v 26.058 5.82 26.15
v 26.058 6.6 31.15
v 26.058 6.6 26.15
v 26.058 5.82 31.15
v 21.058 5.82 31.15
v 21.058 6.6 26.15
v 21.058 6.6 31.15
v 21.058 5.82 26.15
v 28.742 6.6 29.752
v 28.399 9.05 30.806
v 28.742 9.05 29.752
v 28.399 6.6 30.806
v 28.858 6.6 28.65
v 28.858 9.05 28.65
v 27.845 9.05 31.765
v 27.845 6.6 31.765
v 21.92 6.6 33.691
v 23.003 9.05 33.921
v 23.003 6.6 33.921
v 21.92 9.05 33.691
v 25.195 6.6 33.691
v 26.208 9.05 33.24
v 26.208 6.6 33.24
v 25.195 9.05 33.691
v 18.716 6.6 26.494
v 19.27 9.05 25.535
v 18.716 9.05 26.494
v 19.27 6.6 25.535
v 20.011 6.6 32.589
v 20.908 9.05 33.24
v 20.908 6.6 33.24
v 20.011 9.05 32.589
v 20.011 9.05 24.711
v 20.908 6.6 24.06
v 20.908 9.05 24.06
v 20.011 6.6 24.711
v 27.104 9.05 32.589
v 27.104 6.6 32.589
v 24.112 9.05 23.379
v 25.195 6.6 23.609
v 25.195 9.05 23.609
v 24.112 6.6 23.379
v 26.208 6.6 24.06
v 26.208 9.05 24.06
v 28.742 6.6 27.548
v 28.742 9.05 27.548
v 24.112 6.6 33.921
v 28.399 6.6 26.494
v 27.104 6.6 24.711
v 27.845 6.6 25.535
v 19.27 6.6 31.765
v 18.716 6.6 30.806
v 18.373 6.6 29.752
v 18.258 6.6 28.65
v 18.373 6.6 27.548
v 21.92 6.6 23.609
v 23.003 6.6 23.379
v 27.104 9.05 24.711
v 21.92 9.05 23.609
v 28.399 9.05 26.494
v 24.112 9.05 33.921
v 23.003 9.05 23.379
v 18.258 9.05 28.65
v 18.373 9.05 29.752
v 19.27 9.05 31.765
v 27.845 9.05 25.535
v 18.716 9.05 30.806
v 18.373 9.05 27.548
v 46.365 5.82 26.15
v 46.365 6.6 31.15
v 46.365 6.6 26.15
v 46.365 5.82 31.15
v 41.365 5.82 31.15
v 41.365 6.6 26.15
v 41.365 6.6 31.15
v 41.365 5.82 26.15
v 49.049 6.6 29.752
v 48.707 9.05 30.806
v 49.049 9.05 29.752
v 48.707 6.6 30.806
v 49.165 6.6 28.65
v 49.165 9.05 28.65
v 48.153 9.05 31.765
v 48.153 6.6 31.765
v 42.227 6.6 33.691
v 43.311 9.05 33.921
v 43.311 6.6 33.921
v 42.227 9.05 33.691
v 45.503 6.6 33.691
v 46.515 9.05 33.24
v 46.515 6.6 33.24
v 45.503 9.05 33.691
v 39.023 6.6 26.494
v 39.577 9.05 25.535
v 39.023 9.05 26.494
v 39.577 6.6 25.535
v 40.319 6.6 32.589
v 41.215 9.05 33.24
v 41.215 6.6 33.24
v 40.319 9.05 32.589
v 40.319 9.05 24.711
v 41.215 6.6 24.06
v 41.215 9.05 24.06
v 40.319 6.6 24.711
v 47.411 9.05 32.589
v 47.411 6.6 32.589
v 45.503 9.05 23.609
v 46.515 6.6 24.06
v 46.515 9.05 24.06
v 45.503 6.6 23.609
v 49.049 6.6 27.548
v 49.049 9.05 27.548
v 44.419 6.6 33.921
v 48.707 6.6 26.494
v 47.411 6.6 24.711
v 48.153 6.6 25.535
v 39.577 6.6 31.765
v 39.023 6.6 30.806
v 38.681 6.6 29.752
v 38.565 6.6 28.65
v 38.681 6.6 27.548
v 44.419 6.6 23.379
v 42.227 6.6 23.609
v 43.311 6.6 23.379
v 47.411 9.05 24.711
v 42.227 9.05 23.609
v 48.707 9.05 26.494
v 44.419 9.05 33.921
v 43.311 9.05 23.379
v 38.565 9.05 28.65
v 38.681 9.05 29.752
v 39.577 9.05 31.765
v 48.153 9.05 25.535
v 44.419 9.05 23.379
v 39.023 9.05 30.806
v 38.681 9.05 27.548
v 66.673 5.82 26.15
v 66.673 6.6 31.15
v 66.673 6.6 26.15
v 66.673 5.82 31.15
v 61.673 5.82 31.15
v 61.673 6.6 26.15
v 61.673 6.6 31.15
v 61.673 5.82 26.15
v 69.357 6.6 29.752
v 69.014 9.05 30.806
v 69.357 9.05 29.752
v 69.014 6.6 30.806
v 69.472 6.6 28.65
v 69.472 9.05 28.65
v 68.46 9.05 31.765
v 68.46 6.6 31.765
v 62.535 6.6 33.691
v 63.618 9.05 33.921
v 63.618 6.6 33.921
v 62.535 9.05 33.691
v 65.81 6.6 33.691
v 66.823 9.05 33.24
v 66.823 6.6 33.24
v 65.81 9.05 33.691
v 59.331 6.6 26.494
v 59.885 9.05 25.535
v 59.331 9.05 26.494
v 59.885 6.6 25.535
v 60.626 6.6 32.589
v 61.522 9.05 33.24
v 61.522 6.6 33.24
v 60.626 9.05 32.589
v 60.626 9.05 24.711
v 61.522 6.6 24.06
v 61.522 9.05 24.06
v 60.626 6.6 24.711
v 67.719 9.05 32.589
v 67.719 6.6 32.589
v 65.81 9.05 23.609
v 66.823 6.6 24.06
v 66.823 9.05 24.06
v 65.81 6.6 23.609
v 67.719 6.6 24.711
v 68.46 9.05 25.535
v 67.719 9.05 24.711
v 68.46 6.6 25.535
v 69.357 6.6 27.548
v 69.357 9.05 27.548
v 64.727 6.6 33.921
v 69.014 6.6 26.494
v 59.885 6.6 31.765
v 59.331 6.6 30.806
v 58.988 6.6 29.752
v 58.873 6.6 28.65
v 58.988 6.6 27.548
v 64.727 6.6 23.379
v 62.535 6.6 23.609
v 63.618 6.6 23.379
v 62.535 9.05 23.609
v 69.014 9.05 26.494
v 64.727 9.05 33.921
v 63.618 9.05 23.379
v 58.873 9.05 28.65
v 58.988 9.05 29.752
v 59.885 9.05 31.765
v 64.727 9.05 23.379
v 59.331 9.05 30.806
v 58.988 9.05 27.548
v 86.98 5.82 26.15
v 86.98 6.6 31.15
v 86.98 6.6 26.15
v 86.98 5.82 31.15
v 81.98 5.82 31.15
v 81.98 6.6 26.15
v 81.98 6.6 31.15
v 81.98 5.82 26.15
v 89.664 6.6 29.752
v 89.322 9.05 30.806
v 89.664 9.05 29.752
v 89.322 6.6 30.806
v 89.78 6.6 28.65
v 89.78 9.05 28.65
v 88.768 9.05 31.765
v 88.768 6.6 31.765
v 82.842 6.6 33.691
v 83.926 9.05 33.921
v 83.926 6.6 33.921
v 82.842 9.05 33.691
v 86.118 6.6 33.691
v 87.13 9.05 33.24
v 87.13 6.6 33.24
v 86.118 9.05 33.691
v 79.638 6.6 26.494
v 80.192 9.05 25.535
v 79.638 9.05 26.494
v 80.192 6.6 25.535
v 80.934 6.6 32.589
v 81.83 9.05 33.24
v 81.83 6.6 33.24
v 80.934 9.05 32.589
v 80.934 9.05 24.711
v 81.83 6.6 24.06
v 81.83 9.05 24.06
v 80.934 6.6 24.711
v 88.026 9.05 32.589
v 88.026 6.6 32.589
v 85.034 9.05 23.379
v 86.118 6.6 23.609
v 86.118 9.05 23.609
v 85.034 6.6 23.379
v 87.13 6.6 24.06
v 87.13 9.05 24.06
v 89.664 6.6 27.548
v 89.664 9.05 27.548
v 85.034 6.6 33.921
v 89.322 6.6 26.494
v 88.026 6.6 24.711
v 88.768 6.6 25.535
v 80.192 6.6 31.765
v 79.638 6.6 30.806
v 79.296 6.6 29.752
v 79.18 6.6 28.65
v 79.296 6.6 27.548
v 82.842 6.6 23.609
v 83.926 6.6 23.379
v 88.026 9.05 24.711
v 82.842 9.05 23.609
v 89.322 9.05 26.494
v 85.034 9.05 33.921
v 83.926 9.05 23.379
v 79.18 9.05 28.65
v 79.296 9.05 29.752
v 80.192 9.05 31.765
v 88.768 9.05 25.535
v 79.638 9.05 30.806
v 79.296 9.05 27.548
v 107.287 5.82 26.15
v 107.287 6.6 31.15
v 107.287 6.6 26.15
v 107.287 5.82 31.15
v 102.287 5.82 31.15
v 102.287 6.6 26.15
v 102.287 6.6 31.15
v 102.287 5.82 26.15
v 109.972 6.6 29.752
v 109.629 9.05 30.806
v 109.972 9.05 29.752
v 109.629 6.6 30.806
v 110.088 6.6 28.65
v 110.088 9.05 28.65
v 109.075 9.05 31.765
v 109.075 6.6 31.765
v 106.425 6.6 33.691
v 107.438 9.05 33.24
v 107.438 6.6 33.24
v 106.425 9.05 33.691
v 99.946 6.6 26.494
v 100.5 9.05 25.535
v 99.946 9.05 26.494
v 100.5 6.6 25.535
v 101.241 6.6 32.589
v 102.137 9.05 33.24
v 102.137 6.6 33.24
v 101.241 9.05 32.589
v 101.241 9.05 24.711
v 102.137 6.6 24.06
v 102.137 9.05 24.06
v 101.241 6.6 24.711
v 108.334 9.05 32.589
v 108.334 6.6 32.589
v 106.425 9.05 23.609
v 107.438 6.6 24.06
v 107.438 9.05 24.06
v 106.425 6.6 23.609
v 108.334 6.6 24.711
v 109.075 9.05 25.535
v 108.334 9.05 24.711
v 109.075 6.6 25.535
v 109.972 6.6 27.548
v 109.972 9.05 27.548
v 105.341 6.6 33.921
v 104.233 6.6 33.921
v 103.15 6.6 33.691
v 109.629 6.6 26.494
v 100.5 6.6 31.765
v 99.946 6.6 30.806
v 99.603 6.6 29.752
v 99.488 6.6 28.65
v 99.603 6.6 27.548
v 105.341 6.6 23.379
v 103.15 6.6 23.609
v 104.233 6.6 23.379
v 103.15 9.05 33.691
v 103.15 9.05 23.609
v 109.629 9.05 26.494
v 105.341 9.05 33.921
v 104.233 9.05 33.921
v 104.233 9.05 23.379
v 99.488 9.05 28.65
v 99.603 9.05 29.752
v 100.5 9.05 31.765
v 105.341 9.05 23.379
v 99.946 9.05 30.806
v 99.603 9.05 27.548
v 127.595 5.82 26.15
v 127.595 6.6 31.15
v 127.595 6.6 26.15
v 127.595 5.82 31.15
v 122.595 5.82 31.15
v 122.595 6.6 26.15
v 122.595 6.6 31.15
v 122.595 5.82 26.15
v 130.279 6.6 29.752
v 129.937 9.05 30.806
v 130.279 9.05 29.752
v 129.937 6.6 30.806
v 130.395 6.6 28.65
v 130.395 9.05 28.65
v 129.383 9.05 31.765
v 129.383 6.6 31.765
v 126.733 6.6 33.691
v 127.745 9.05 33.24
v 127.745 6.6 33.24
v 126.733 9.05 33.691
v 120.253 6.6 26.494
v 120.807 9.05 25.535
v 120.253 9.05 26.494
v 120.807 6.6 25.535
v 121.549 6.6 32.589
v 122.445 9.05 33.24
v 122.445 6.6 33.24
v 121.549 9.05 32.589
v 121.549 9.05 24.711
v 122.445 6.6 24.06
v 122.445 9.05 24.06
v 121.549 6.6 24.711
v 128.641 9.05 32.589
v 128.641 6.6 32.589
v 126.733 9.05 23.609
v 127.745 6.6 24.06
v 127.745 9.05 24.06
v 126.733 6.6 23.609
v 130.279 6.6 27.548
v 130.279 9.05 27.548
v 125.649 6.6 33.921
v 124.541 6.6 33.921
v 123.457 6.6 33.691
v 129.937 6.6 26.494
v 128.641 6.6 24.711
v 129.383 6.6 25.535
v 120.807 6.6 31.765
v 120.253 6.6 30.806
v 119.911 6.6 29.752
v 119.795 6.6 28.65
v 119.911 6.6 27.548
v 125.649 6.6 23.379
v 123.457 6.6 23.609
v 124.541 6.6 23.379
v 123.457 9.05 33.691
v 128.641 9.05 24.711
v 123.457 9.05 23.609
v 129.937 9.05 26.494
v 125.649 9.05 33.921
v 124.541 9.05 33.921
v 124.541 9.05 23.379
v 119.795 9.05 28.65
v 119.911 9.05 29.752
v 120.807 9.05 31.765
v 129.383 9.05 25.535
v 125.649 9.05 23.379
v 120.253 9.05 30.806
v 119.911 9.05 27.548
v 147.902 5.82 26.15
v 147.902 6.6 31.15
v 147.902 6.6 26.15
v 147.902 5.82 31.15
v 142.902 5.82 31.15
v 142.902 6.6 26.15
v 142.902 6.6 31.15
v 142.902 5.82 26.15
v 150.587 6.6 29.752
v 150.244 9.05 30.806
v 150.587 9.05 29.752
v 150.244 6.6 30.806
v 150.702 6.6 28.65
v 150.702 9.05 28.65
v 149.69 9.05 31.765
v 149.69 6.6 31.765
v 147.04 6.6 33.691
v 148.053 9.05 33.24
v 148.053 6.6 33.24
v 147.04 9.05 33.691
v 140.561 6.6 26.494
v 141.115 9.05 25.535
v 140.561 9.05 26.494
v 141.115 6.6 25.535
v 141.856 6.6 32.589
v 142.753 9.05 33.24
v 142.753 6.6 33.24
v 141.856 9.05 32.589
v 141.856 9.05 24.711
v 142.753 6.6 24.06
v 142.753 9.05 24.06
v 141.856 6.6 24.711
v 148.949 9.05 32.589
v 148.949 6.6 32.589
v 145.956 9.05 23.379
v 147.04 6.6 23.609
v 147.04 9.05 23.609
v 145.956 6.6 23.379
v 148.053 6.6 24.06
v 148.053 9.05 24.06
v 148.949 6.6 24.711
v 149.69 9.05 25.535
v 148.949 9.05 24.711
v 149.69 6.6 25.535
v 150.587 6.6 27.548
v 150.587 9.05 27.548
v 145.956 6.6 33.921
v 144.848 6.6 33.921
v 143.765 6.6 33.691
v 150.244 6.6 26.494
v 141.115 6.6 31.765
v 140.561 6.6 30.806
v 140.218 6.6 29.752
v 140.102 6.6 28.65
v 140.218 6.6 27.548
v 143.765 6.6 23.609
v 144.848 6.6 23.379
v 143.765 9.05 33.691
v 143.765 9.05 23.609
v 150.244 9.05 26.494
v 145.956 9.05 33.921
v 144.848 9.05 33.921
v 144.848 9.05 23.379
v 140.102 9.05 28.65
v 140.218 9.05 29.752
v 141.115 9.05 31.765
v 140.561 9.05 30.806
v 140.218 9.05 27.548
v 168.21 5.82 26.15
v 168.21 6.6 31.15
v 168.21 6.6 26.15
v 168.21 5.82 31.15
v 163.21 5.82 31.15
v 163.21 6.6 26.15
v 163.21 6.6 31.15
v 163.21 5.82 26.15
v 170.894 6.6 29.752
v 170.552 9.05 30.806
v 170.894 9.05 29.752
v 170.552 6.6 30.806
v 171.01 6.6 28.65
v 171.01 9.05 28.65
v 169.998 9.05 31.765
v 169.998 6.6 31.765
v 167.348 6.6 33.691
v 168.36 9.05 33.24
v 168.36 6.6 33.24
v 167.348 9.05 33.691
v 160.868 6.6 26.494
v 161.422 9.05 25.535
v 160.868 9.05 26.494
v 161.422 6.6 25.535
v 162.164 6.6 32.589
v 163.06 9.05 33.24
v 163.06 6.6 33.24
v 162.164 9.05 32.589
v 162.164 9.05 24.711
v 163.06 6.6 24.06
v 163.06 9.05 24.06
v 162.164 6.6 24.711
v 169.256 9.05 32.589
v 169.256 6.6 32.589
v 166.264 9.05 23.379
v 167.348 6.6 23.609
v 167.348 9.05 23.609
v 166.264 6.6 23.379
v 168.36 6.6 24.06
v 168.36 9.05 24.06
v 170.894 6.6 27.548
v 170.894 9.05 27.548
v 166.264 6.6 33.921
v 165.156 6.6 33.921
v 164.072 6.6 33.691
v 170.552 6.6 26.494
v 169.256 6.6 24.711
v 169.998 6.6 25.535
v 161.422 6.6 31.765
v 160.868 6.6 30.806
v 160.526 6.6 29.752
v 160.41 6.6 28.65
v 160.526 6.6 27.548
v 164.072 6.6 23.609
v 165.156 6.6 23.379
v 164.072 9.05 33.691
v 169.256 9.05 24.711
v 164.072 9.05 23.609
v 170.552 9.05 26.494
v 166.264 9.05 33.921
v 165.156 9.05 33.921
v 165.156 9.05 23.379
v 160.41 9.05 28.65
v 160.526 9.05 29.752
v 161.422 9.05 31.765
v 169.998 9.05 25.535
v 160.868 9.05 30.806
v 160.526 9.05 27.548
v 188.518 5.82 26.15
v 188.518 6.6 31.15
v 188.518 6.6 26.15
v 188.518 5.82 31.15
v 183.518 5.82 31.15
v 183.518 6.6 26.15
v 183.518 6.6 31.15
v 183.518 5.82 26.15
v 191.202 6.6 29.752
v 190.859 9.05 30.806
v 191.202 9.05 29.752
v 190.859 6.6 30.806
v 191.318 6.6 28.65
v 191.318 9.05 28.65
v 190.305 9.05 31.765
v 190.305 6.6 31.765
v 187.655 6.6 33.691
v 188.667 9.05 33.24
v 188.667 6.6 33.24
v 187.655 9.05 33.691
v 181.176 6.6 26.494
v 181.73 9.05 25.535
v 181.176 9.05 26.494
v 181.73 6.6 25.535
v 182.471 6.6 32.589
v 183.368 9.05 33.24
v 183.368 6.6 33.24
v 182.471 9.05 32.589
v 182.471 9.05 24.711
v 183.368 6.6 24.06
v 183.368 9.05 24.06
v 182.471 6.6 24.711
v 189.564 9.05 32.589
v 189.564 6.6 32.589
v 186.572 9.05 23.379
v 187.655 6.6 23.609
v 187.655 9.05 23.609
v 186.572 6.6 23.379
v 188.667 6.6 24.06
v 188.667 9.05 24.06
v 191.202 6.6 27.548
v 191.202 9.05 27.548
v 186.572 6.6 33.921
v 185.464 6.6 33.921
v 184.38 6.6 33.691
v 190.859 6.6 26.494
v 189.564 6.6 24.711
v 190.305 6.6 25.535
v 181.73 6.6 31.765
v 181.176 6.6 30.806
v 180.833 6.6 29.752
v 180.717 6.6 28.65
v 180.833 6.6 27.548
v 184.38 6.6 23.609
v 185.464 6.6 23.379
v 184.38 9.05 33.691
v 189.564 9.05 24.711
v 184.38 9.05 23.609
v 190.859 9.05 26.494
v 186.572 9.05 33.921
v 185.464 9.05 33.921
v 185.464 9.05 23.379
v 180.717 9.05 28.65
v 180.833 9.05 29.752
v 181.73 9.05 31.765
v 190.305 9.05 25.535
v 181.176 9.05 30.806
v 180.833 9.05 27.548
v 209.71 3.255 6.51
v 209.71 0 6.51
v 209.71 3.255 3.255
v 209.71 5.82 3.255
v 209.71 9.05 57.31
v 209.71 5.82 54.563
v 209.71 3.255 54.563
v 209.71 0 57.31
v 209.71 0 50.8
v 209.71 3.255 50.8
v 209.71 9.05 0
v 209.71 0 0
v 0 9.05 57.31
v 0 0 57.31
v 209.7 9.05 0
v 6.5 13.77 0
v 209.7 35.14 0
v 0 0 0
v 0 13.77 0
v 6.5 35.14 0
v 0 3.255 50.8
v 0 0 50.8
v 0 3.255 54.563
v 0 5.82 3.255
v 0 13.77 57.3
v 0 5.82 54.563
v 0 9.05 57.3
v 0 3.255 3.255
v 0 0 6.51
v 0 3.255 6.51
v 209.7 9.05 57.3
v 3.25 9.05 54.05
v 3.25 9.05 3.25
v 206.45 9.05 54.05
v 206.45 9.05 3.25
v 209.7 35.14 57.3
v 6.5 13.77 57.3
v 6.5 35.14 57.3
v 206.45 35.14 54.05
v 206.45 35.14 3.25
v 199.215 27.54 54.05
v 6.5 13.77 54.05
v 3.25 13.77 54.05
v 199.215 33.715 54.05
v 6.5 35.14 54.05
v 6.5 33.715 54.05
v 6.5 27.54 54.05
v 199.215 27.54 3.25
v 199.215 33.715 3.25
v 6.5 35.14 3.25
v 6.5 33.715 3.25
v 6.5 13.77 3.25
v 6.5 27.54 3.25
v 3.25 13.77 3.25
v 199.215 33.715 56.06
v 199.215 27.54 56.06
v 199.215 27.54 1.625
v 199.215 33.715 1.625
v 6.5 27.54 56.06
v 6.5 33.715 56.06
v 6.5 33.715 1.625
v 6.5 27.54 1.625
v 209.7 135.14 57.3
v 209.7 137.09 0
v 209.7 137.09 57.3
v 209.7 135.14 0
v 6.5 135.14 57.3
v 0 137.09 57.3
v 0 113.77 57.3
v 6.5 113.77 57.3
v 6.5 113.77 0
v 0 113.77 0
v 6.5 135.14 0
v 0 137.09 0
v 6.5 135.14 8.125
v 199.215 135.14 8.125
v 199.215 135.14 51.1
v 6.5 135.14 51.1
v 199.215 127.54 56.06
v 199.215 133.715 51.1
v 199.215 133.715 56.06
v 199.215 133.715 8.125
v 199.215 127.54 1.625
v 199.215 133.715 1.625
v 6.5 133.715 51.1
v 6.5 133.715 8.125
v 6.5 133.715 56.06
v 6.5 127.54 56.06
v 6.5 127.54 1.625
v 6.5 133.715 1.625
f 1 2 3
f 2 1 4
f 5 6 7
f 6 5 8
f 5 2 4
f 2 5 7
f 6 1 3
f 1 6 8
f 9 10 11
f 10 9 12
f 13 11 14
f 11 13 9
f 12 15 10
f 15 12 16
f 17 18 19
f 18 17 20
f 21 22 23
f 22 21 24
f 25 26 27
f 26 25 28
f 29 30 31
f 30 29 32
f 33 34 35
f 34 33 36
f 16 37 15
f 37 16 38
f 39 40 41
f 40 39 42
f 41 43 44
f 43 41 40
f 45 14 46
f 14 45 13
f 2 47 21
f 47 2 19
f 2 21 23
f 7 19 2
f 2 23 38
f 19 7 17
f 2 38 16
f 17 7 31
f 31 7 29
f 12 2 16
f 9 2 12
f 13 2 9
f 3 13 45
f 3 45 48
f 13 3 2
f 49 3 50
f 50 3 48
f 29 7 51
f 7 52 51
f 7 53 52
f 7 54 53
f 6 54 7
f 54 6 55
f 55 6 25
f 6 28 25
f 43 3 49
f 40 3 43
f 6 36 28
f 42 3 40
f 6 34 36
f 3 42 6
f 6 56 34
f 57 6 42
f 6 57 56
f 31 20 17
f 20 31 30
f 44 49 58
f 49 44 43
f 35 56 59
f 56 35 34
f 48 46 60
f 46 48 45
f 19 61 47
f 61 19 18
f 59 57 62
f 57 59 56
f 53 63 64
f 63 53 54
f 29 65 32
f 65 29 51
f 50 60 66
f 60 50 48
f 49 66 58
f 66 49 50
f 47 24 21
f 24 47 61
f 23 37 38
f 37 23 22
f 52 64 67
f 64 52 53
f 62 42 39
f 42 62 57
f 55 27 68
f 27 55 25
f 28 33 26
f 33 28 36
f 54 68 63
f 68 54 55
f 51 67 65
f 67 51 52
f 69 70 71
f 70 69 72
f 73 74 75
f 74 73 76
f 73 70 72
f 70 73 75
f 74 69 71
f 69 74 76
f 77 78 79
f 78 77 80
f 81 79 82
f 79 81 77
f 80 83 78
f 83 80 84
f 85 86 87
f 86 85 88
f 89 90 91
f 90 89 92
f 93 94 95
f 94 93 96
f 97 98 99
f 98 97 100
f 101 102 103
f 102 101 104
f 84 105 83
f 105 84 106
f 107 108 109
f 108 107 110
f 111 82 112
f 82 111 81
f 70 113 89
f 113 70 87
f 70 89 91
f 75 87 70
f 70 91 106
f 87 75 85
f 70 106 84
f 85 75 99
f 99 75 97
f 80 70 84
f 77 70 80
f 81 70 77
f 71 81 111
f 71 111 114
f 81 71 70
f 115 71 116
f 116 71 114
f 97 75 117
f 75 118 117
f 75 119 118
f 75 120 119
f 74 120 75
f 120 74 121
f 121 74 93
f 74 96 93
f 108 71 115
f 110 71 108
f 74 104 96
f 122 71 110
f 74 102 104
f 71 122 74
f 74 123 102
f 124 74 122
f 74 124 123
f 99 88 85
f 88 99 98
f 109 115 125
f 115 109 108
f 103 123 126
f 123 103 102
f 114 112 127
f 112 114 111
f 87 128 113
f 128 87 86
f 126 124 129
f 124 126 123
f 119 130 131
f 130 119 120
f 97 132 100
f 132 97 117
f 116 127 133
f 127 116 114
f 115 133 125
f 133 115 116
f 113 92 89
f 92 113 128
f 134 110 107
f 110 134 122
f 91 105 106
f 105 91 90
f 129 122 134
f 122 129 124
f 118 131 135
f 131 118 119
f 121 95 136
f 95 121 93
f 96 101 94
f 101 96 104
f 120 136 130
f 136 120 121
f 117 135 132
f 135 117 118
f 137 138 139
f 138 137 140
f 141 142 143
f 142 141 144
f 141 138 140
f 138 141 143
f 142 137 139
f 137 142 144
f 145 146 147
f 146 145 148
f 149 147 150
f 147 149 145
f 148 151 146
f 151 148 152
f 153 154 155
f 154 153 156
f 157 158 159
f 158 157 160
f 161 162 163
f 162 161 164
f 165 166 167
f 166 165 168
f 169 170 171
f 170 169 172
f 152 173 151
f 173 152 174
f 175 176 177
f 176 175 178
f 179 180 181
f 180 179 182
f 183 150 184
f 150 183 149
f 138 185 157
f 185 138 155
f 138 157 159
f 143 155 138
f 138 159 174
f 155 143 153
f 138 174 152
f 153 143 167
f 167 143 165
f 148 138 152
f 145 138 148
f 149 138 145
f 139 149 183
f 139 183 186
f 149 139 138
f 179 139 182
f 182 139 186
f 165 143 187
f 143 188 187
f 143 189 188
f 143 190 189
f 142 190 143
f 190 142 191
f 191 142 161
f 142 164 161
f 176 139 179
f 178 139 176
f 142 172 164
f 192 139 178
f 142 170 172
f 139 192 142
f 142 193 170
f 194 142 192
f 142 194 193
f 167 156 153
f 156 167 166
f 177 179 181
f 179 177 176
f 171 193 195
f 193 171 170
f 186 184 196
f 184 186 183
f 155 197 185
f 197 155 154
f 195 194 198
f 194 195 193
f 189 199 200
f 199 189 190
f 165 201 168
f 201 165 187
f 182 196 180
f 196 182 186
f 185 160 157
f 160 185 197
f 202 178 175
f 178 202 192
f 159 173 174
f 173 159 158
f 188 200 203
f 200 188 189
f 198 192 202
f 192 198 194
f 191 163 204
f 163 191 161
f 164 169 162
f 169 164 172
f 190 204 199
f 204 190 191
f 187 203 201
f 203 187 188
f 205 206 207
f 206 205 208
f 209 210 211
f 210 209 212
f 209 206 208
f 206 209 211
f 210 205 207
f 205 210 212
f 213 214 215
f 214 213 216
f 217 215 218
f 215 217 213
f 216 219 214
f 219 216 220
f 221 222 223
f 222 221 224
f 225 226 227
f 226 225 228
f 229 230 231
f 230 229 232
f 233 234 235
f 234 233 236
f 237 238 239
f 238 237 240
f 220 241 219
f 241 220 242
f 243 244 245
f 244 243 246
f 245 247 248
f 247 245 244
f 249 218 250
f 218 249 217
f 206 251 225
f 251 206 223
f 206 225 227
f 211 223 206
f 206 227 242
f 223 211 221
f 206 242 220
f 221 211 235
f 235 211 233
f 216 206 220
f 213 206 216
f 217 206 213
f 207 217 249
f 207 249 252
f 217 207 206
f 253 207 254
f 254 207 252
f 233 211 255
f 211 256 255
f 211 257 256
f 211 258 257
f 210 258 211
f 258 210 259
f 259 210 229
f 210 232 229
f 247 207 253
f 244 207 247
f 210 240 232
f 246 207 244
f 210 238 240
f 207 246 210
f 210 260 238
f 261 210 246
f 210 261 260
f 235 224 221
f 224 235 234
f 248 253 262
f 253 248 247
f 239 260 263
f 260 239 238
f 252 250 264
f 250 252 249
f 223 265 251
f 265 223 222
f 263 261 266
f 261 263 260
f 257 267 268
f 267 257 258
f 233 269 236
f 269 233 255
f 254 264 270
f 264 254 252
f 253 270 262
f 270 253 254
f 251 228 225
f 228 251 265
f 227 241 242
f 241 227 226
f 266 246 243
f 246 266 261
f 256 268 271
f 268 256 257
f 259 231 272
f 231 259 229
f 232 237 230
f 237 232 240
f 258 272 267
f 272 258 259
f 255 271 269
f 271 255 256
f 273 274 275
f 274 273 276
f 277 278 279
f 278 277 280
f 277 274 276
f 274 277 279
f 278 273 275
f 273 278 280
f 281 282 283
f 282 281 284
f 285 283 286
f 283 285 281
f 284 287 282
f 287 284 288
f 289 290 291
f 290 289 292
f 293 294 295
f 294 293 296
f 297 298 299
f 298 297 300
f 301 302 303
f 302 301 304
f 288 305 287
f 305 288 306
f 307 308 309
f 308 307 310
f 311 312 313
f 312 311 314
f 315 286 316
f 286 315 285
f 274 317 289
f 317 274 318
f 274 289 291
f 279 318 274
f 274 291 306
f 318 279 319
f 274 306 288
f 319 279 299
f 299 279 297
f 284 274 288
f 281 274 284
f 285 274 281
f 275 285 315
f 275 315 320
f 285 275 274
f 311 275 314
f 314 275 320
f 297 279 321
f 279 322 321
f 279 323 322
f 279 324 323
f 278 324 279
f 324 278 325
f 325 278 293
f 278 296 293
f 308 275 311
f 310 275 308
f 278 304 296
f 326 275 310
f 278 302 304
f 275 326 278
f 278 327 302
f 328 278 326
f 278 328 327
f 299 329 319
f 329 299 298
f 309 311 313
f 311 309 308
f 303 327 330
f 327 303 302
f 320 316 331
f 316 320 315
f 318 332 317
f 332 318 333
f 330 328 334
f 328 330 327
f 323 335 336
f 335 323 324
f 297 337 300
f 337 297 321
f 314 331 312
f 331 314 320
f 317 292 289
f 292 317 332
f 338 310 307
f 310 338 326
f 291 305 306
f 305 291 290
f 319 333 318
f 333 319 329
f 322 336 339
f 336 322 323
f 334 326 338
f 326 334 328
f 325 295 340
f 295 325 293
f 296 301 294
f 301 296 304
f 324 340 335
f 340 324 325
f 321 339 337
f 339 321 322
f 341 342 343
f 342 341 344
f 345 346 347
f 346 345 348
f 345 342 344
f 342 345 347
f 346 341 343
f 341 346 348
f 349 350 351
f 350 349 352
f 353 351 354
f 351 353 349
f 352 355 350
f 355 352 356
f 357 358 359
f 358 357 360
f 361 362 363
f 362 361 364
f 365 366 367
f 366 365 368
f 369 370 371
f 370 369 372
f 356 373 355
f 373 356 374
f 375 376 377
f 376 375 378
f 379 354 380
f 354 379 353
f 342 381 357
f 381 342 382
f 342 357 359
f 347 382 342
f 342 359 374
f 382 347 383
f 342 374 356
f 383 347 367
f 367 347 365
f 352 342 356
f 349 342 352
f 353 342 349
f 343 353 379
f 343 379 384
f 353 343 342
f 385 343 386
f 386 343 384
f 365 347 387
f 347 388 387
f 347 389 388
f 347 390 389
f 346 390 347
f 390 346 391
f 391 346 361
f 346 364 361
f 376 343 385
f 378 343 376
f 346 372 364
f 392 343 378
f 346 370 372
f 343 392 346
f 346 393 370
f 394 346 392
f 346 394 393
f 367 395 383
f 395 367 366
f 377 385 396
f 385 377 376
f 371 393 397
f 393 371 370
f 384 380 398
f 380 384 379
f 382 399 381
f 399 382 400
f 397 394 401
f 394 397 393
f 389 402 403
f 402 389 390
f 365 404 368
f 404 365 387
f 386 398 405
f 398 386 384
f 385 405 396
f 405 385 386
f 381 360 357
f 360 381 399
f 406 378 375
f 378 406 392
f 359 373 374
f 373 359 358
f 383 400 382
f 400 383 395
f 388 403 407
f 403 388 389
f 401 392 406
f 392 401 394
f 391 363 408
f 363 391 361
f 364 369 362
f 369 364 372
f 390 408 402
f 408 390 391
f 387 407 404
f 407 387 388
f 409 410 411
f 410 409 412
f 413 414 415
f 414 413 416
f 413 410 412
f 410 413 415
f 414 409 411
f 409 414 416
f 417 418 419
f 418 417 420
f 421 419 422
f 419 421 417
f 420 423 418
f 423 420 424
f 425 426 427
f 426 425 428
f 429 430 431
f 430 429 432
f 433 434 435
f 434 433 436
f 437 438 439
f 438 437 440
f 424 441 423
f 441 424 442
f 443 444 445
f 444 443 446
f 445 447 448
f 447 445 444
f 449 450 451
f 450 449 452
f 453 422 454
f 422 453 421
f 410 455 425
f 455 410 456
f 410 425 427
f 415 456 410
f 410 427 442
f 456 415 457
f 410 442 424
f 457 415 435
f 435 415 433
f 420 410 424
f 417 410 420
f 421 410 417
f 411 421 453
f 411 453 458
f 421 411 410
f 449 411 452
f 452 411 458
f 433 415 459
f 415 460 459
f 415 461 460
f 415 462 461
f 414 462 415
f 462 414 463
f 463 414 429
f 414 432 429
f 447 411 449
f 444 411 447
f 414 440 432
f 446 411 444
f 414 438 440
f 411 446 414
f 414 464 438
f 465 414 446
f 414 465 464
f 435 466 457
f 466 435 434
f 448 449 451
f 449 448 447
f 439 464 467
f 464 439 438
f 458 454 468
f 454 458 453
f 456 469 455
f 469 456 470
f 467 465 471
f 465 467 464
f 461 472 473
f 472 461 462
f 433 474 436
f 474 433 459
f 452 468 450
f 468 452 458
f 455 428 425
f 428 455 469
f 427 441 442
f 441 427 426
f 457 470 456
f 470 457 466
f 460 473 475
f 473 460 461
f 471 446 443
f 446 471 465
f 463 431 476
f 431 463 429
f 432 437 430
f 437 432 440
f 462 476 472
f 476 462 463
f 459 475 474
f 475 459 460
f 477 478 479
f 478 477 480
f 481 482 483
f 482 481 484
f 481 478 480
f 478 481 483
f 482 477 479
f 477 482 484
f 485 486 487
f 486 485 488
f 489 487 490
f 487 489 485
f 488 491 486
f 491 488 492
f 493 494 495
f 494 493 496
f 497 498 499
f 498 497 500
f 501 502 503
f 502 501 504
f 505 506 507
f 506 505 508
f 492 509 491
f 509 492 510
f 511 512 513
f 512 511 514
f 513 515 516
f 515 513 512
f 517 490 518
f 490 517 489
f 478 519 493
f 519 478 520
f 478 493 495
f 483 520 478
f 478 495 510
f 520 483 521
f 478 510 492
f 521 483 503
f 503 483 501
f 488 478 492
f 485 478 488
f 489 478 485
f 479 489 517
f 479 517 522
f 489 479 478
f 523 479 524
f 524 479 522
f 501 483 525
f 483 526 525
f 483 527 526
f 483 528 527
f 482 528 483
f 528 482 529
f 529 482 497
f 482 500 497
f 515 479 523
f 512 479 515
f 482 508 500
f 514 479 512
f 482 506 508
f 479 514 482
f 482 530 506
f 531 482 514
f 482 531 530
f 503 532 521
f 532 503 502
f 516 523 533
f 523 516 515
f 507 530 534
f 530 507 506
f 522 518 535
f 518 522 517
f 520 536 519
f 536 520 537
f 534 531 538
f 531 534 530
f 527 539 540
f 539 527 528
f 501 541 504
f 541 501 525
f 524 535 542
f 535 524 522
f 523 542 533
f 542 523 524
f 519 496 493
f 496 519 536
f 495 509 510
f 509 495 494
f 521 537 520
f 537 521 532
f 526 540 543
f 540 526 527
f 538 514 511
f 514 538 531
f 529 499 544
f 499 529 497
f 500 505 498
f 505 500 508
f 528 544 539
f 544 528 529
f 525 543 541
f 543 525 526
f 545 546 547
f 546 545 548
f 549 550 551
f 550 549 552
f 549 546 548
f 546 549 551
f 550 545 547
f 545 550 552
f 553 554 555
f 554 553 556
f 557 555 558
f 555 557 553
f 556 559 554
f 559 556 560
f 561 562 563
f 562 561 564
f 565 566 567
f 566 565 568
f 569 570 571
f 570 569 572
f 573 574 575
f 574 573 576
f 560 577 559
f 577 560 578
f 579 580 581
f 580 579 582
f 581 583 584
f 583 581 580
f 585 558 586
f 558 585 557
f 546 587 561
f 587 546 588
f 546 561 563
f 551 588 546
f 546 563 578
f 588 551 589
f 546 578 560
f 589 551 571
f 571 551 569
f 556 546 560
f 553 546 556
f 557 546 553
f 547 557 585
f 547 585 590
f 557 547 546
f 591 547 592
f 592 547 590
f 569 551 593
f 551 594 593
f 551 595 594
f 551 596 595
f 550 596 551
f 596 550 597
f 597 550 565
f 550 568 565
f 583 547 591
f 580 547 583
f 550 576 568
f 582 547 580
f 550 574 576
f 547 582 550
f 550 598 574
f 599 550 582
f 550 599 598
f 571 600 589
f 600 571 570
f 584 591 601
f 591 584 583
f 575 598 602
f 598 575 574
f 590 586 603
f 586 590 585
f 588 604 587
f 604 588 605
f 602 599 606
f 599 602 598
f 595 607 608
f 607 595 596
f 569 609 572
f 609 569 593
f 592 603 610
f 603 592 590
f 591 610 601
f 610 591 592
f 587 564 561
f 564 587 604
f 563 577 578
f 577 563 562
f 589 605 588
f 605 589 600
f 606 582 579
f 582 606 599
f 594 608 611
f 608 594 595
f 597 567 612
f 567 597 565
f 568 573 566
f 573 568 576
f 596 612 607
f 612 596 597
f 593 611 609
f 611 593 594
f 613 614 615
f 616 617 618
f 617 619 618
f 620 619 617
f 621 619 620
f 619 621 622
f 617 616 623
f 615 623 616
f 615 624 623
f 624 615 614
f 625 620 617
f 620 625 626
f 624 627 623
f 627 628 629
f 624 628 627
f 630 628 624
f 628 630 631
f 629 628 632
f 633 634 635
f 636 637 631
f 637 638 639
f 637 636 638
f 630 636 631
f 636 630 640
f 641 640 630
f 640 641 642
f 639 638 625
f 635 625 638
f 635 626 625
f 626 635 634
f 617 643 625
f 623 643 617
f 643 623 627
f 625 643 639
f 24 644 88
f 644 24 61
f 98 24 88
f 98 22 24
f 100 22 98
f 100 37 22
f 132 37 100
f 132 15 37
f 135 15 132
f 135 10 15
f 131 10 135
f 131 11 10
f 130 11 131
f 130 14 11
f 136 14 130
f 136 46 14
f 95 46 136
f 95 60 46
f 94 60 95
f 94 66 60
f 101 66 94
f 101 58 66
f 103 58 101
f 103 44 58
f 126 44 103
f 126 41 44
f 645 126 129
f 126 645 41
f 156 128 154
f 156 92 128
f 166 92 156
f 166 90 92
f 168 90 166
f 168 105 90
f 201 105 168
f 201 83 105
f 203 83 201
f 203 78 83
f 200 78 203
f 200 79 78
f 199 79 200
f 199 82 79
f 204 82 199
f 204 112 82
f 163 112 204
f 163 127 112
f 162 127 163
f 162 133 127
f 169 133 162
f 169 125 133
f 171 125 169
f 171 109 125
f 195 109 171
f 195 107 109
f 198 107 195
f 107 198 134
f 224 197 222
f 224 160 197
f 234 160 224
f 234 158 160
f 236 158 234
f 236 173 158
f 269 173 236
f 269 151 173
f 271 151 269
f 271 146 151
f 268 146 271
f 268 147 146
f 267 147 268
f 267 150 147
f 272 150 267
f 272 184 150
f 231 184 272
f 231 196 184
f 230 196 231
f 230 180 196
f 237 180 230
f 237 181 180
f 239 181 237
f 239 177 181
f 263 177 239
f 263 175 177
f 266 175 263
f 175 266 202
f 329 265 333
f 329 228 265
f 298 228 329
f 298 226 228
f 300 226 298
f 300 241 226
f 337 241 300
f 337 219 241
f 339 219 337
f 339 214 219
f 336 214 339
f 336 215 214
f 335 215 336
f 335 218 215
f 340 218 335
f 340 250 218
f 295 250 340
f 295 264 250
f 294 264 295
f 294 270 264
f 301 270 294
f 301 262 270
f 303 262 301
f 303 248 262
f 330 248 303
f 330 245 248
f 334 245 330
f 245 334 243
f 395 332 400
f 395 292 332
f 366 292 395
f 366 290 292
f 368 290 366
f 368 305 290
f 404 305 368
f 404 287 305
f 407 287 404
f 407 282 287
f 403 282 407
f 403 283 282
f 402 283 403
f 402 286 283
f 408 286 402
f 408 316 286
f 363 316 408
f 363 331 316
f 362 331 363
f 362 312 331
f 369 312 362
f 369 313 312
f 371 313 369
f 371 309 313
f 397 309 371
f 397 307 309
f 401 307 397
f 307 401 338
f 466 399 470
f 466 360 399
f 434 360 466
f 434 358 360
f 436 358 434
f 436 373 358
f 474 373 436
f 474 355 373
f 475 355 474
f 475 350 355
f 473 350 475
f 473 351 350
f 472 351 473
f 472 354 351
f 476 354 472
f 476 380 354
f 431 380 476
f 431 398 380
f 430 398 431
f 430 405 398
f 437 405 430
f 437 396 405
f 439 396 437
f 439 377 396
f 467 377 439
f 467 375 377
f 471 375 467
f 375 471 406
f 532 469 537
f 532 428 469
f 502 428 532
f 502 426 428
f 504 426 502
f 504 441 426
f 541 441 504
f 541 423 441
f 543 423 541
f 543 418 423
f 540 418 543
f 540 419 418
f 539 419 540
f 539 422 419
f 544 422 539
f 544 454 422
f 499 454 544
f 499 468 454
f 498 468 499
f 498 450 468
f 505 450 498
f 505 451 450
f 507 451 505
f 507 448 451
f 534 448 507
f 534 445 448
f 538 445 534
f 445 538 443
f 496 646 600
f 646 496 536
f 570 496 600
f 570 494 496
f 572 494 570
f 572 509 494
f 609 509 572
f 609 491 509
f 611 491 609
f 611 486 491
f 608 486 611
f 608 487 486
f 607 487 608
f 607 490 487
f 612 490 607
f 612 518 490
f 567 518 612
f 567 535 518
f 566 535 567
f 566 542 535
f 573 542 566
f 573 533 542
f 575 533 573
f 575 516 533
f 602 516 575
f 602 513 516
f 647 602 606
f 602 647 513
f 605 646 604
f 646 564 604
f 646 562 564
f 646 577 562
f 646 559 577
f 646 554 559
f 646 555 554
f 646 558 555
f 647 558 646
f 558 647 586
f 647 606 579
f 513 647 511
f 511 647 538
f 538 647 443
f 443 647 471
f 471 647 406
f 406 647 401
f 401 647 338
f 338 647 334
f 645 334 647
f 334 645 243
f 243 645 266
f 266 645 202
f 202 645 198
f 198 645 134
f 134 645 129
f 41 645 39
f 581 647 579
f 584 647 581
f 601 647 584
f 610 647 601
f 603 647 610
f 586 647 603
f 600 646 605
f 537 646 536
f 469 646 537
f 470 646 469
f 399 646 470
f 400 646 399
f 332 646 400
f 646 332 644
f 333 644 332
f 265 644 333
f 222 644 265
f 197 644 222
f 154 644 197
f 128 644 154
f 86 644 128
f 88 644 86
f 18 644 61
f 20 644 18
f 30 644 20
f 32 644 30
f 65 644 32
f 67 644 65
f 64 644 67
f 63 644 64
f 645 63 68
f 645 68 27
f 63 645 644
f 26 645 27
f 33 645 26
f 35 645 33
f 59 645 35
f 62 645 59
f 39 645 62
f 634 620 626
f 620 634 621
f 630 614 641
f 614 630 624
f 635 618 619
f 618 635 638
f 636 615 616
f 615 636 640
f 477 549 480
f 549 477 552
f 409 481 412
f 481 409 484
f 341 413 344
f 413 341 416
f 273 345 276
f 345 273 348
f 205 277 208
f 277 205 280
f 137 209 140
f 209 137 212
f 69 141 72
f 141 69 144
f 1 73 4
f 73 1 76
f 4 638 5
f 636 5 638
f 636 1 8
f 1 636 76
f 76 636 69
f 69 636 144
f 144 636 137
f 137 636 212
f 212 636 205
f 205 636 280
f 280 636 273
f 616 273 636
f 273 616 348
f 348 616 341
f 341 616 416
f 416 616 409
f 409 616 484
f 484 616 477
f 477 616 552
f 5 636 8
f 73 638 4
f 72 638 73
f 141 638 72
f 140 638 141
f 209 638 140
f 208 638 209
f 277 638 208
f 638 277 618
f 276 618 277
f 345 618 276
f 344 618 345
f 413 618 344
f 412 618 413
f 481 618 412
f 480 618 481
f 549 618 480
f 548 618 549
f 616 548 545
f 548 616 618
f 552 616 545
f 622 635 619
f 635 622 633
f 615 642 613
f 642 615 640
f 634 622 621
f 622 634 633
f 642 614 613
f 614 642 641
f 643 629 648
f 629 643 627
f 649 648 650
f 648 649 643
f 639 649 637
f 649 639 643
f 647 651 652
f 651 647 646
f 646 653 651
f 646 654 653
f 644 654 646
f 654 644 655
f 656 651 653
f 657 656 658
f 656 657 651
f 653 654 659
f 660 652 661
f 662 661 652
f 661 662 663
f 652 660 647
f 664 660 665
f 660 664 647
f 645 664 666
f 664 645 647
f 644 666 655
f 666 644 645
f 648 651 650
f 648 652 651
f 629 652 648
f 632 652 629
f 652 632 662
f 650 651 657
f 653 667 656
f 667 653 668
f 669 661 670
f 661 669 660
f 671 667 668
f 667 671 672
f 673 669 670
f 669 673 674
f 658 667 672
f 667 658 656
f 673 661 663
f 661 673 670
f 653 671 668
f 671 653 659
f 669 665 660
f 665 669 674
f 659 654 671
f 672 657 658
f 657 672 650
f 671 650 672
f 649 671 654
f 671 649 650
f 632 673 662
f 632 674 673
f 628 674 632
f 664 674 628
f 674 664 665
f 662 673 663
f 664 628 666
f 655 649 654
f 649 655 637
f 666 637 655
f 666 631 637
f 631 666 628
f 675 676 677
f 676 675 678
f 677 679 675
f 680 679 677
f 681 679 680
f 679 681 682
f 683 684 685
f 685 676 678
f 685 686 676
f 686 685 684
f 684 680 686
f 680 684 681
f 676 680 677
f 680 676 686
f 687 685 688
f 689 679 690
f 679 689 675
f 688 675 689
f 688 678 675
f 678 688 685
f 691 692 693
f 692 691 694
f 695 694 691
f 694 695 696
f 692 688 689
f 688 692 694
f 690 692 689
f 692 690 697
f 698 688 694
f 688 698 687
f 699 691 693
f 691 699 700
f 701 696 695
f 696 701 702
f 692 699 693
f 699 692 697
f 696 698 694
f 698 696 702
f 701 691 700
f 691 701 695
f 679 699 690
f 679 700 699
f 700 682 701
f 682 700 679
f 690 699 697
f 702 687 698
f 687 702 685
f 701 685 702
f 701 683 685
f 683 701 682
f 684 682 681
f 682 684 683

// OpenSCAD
// file: ../lib/hull.scad
/*
hull.scad - a library that leverages the hull() procedure
Author: Elliot Williams
github: https://gist.github.com/hexagon5un )
source: https://gist.github.com/hexagon5un/73e187dfa0404c69177795424f397ce6#file-hull-scad

Featured in the hackaday atricle: 'OPENSCAD: TIEING IT TOGETHER WITH HULL()'
https://hackaday.com/2018/02/13/openscad-tieing-it-together-with-hull/
*/
module multiHull(){
	for (i = [1 : $children-1])
		hull(){
			children(0);
			children(i);
		}
}

module sequentialHull(){
	for (i = [0: $children-2])
		hull(){
			children(i);
			children(i+1);
		}
}

/* Extended fun hull functions */ 

module cylinders(points, diameter, thickness){
	for (p=points){
		translate(p) cylinder(d=diameter, h=thickness, center=true);
	}
}

module plate(points, diameter, thickness, hole_diameter){
	difference(){
		hull() cylinders(points, diameter, thickness);
		cylinders(points, hole_diameter, 1000);
	}
}

module bar(length, width, thickness, hole_diameter){
	plate([[0,0,0], [length,0,0]], width, thickness, hole_diameter);
}

module rounded_box(points, radius, height, facets=30){
	hull(){
		for (p = points){
			translate(p)
				cylinder(r=radius, h=height, $fn=facets);
		}
	}
}

module point_cloud(points, radius=1, facets=8){
	for (p=points){
		translate(p)
			sphere(radius/cos(180/facets), $fn=facets);
		// polygon sphere circumscribed on radius
	}
}

module point_hull(points, radius=1, facets=8){
	hull(){
		point_cloud(points, radius, facets);
	}
}

// Shrink the exterior of the points so that the hull fits inside
function select(vector, i) = [ for (p=vector) p[i] ];
function axis_center(v, i) = (max(select(v, i)) - min(select(v,i)))/2;
function center(v) = [ for (i = [0,1,2]) axis_center(v, i) ];
function shrink_point(point, center, radius) = [ for (i = [0,1,2]) point[i] > center[i] ? point[i] - radius : point[i] + radius ]; 
function shrink(points, radius) = [ for (p = points) shrink_point(p, center(points), radius) ];

module interior_point_hull(points, radius=1){
	point_hull(shrink(points, radius), radius);
}

module interior_rounded_box(points, radius, height){
	rounded_box(shrink(points, radius), radius, height);
}


module mirror_copy(v = [1, 0, 0]) {
    children();
    mirror(v) children();
}
// file: ../lib/neo_pixel.scad
///< Alitovo Neo pixel RGB X000UCVKBH 2812b-1-LED-WH
use <../lib/math.scad>;
use <../lib/utils.scad>;

///< Parameters - Begin
led_assembly_h = 2.8;
led_assembly_d = 9.6;

///< Diameter of the PCB 
pcb_d = 9.6;
pcb_h = 1.2;

///< Demensions of the LED IC
led_w = 5;
led_d = led_w;
led_h = led_assembly_h - pcb_h;


///< Modules
module pcb(h = pcb_h, d = pcb_d){
     ///< LED PCB definition
     ///< The h/d parameters are passed in to
     ///< allow for socketing of the LEDs.
     color( rand_clr() )cylinder( h=h, d=d, $fn = 30 );
}

module led(){
     ///< Neo pixel LED (2812b-1)
     union(){
         color( rand_clr() )cube( [ led_w, led_d, led_h ] );
         color( rand_clr() )
              translate([led_w/2,led_d/2, 0] )
              cylinder( h=led_h, d= led_w, $fn = 30 );
         }
}

module neo_pixel(h=pcb_h, d=pcb_d){
     ///< Assembly of the led and pcb_pad
     union(){
          translate([-led_w/2,-led_d/2,h-0.01])led();
          pcb(h=h, d=d);
          }

}

///< Build object
///< Remove this when including
//neo_pixel();
// file: ../lib/basics.scad
///< Basics module
use <math.scad>;
use <utils.scad>;
use <hull.scad>;

module triangle( w, d, h ){
     difference(){
	  hyp = hyp_from_sides( d, h );
	  color( "red" )cube( [w, d, h] );
	  rotate( [ 45, 0, 0 ] )
	       translate( [ -0.01, 0, 0 ] )
	       color( "green" )cube( [w+0.2, hyp, h] );
     }
}

module tri_xy(pt1, pt2, pt3, h=1) {
     color( rands( 0,1,3 ) ) linear_extrude( height=h )
	  polygon( points=[ pt1, pt2, pt3 ] );
}

module triangle_xy( pts, h=1) {
     color( rands( 0,1,3 ) ) linear_extrude( height=h )
	  polygon( points = pts );
}

module oval(w,l, height, center = false, fn = 30) {
 scale([1, l/w, 1]) cylinder(h=height, r=w, center=center, $fn = fn);
}

module pipe( outer, inner, height, fn = 60 ){
     offset_percent = 0.25;
     inner_h = height + (offset_percent * 2 );
     difference(){
     ///< Debug with union(){
	  cylinder(r=outer, h = height, $fn = fn );
	  translate([0,0,-offset_percent]){
	       color("green",0.5)cylinder(r=inner, h = inner_h, $fn = fn );
	  }
     }
}

module rounded_pipe( r, h, fn = 60 ){
     cylinder(r = r, h = h, $fn = fn );

     color("blue")
     translate([0,0,h])
	  sphere(r, $fn = fn );

     color("red")
     translate([0,0,0])
	  sphere(r, $fn = fn );
}

/// Stackoverflow example module for a line
/// https://stackoverflow.com/questions/49533350/is-that-possible-to-draw-a-line-using-openscad-by-joining-different-points
module line(start, end, thickness = 1, fn = 30) {
    hull() {
	translate(start) sphere(thickness, $fn = fn);
	translate(end) sphere(thickness, $fn = fn);
    }
}


/*
Hulled box:

Parameterized box with rounded corners. This uses the hull.scad
to hull four cylinders around four point in space. This variation
offsets the box to zero/zero and takes in w,d,h to mesh better
with tuples.
*/
module hulled_cube( w, d, h, r = 1 ){
    points = [
	[ 0, 0, 0 ],
	[ w, 0, 0 ],
	[ 0, w, 0 ],
	[ w, w, 0 ],
	];
    resize( [w,d,h]){
	translate( [r, r,0] ){
	    rounded_box( points, radius = r, height=h );
	}
    }
}
// file: led_array.scad
///< LED frame for the neo pixel array
use <../lib/math.scad>;
use <../lib/utils.scad>;
include <../lib/neo_pixel.scad>

///< Parameters
pcb_socket_d = led_assembly_d + 1;
pcb_socket_h = 1.0;

led_array_w  = 100;
led_array_d  = led_assembly_h+pcb_socket_h;
led_array_h  = pcb_socket_d+1.5;

///< Modules
module led_array( w, d, h, num_leds = 10 ){
    led_spacing_w = (w - 0.125)/( num_leds );

    ///< Make x number of slots
    for (i = [0:num_leds]){
        offset_spacing = (( i * led_spacing_w ) + ( led_spacing_w ));
        remaining = w - offset_spacing;
        if( remaining >= led_spacing_w ){
            translate( [ offset_spacing, (h+0.1), h/2 ] )
                rotate( [ 90, 0, 0 ])
                color( rand_clr() )
                neo_pixel( h=h, d=pcb_socket_d);
        }
    }
}

///< Build object
led_array( led_array_w, led_array_d, led_array_h );
// file: ../lib/containers.scad
///< Object definition
use <math.scad>;
use <utils.scad>;
use <basics.scad>;

///< Parameters
x = 0;
y = 0;
z = 0;

height = 40;
width  = 20;
depth  = 20;
wall_t = 4;

///< Modules
module hulled_box( w, d, h, t = 1, r = 1 ){
    difference(){
        hulled_cube( w, d, h, r = r );
        translate( [ t/2, t/2, t+0.1  ] )
            color( rand_clr() )hulled_cube( w-t, d-t, h-t, r = r );
    }
}

module hulled_box_friction_lid( w, d, h, t = 1, r = 1, pr = 1, grip = false ){
    ///< Friction control
    fric = ( t + 0.1 );
    difference(){
        union(){
            hulled_cube( w, d, t, r=r  );
            translate( [ t/2, t/2, t+0.1  ] )
                color( rand_clr() )hulled_cube( w-fric, d-fric, h*0.125, r=pr );
        }
        if( grip ){
            gh = ( w * 0.75 );
            gd = ( t * 0.33 );
            translate( [ gh/6,0,t/2  ] )rotate( [ 0, 90, 0 ] )
                color( rand_clr() ) cylinder( h = gh, d = gd, $fn=30 );
            }
        }
}


///< Build object
translate( [ x, y, z ] ) hulled_box( width, depth, height, wall_t );
translate( [ width + 10, y, z ] ) hulled_box_friction_lid( width, depth, height, wall_t, pr = 10, grip = true );
// file: frame.scad
///< Object definition
use <../lib/math.scad>;
use <../lib/utils.scad>;
use <led_array.scad>;
include <nameplate.scad>

///< Parameters
esp8266_h = 10;

module frame( w, d, h, pad = 6.5, show_nameplate = false ){

     ///< Frame demensions
     frame_clearance = 0.01;
     frame_p = pad + frame_clearance; //< Padding
     frame_w = w + frame_p;
     frame_d = d + frame_p;
     frame_h = h + frame_p;

     frame = [ frame_w, frame_d, frame_h ];
     frame_inset = [0, frame_p/2, frame_p/2 ];
     nameplate_cut = [ ( frame_w + ( frame_p * 2.0 ) ) * 1.01,
                       d * 1.01,
                       h * 1.01 ];

     view_w = frame_w;
     view_d = d + pad;
     view_h = h - ( frame_p);
     view_cut = [ view_w, view_d, view_h ];

     ///< c-clamp
     difference(){
         color( rand_clr() )cube( frame );
         color( "orange" )translate( frame_inset )Nameplate( nameplate_cut );
         color( "red" )
             translate( [ 0, frame_d/2, frame_p ] )
             mirror( [ 0, 1, 0 ] )cube( view_cut );
         translate( [ pad/2, ( pad ), pad/2 ] )
             led_array( w, d, h );
     }

     
}

module shell( w, d, h, pad = 5 ){
     shell_w = w + pad;
     shell_d = d + pad;
     shell_h = h + pad;

     cube( [ pad, d, shell_h ] );
     translate( [ shell_w-pad, 0, 0 ] )
	  cube( [ pad, d, shell_h ] );
     translate( [ 0, d, 0 ] )
	  cube( [ shell_w, pad, shell_h ] );
     cube( [ shell_w, d, pad ] );
}

///< Build object

echo( nameplate_w, nameplate_d, nameplate_h  );
frame( nameplate_w, nameplate_d, nameplate_h  );
//translate( [ 0, nameplate_d+5, 0 ] ){
//     shell( nameplate_w, esp8266_h, nameplate_h  );}
// file: nameplate.scad
///< Nameplate
/*
https://en.wikipedia.org/wiki/Nameplate
Excerpt:  'Although office nameplates range in size, the most popular nameplate size is 2 by 8 inches (5.08 cm × 20.32 cm)'

*/
use <../lib/math.scad>;
use <../lib/utils.scad>;

///< Parameters
nameplate_w_inches = 8;
nameplate_h_inches = 2;
nameplate_d_inches = 0.10;

nameplate_w = in2mm( nameplate_w_inches );
nameplate_h = in2mm( nameplate_h_inches );
nameplate_d = in2mm( nameplate_d_inches );

nameplate_debug = false;

if( nameplate_debug ) {
     echo( "Nameplate width: ",  nameplate_w,  "mm" );
     echo( "Nameplate height: ", nameplate_h, "mm" );
     echo( "Nameplate depth: ",  nameplate_d,  "mm" );
}

nameplate = [ nameplate_w, nameplate_d, nameplate_h ];

///< Modules
module Nameplate( size, center = false ) {
     cube( size, center = center );
}
// file: ../lib/utils.scad
///< Utilities

function rand_clr() = rands( 0,1,3 );

///< Length conversions
function in2mm( i ) = ( i * 25.4 ); 
function mm2in( m ) = ( m / 25.4 );

/// This is pulled from stackoverflow
/// https://stackoverflow.com/questions/45826208/openscad-rotating-around-a-particular-point

// rotate as per a, v, but around point pt
module rotate_about_pt(a, v, pt) {
    translate(pt)
        rotate(a,v)
            translate(-pt)
                children();   
}
// file: ../lib/math.scad
///< Math scad module


///< Find the hypotenuse from two sides of a right triangle
function hyp_from_sides( a, b ) = sqrt( pow( a, 2 ) + pow( b, 2 ) );

///< Find equal sides from hypotenuse of a right triangle
function sides_from_hyp(h) = sqrt( pow( h, 2 ) / 2 );

///< Find A from hypotenuse and B
function a_from_hb( h, b ) = sqrt( pow( h, 2 ) - pow( b, 2 ) );

function dist_2d( pt2, pt1 ) = sqrt(pow(( pt2[0]-pt1[0] ),2) + pow(( pt2[1]-pt1[1]),2) );

function mid_pt_2d( pt2, pt1 ) = [( pt1[0]+pt2[0] )/2, ( pt1[1]+pt2[1] )/2, 0 ];
///< Test for math functions

A = 3;
B = 4;
echo("Given A=", A, "and B=", B );
H = hyp_from_sides( A, B );
echo("Hypotenuse=", H );
echo("Calc Correct = ", (H == 5) );

echo("Given H=", H, " which is a hypotenuse with equal sides" );
echo( "the sides=", sides_from_hyp( H ) );

echo("Given H=", H, "B=", 4 );
echo("A=", a_from_hb( H, 4 ) );

echo("Distance from [-1,1] and [3,4] = ", dist_2d( [-1,1],[3,4]) );
// main file
///< Object definition
use <../lib/math.scad>;
use <../lib/utils.scad>;
include<nameplate.scad>;
include<frame.scad>;
use <../lib/containers.scad>;

depth = 25;
thickness = 6.5;


///< Component housing
comp_w = nameplate_w+thickness;
comp_d = nameplate_d + depth;
comp_h = nameplate_h+thickness;

module framebox(){
difference(){
     translate( [0, thickness*1.2, 0] )cube([ comp_w, comp_d, comp_h ], false );
     translate( [thickness/2, 0, thickness/2] )
	  color( rand_clr() )cube([ comp_w-thickness,
				    (comp_d+thickness)*1.5,
				    comp_h-thickness ], false );
     }
}


///< Lid Slide
module slide_lid(){

     ///< Backing
     color( rand_clr() ) translate( [ 0, comp_d+thickness+1.10, 0  ] )
	  cube( [ comp_w, thickness*0.30, comp_h ] );
     color( rand_clr() ) translate( [ 0, comp_d+thickness-2, thickness * 1.25 ] )
	  cube( [ comp_w*0.95, thickness*0.50, comp_h*0.75 ] );
     ///< Slide
     color( rand_clr() ) translate( [ 0, comp_d, thickness/4  ] )cube( [ comp_w*0.95, thickness * 0.95, comp_h * 0.95 ] );
     ///< Right Wall
     color( rand_clr() ) translate( [ 0, comp_d/2, 0 ] )cube( [ thickness,comp_d-thickness + 1,comp_h ] );
}

module assembly(){
//union(){
difference(){
     framebox();
     color( rand_clr() )slide_lid();
     }
}

assembly();

translate( [ 0, 100, 0 ] ) slide_lid() ;
